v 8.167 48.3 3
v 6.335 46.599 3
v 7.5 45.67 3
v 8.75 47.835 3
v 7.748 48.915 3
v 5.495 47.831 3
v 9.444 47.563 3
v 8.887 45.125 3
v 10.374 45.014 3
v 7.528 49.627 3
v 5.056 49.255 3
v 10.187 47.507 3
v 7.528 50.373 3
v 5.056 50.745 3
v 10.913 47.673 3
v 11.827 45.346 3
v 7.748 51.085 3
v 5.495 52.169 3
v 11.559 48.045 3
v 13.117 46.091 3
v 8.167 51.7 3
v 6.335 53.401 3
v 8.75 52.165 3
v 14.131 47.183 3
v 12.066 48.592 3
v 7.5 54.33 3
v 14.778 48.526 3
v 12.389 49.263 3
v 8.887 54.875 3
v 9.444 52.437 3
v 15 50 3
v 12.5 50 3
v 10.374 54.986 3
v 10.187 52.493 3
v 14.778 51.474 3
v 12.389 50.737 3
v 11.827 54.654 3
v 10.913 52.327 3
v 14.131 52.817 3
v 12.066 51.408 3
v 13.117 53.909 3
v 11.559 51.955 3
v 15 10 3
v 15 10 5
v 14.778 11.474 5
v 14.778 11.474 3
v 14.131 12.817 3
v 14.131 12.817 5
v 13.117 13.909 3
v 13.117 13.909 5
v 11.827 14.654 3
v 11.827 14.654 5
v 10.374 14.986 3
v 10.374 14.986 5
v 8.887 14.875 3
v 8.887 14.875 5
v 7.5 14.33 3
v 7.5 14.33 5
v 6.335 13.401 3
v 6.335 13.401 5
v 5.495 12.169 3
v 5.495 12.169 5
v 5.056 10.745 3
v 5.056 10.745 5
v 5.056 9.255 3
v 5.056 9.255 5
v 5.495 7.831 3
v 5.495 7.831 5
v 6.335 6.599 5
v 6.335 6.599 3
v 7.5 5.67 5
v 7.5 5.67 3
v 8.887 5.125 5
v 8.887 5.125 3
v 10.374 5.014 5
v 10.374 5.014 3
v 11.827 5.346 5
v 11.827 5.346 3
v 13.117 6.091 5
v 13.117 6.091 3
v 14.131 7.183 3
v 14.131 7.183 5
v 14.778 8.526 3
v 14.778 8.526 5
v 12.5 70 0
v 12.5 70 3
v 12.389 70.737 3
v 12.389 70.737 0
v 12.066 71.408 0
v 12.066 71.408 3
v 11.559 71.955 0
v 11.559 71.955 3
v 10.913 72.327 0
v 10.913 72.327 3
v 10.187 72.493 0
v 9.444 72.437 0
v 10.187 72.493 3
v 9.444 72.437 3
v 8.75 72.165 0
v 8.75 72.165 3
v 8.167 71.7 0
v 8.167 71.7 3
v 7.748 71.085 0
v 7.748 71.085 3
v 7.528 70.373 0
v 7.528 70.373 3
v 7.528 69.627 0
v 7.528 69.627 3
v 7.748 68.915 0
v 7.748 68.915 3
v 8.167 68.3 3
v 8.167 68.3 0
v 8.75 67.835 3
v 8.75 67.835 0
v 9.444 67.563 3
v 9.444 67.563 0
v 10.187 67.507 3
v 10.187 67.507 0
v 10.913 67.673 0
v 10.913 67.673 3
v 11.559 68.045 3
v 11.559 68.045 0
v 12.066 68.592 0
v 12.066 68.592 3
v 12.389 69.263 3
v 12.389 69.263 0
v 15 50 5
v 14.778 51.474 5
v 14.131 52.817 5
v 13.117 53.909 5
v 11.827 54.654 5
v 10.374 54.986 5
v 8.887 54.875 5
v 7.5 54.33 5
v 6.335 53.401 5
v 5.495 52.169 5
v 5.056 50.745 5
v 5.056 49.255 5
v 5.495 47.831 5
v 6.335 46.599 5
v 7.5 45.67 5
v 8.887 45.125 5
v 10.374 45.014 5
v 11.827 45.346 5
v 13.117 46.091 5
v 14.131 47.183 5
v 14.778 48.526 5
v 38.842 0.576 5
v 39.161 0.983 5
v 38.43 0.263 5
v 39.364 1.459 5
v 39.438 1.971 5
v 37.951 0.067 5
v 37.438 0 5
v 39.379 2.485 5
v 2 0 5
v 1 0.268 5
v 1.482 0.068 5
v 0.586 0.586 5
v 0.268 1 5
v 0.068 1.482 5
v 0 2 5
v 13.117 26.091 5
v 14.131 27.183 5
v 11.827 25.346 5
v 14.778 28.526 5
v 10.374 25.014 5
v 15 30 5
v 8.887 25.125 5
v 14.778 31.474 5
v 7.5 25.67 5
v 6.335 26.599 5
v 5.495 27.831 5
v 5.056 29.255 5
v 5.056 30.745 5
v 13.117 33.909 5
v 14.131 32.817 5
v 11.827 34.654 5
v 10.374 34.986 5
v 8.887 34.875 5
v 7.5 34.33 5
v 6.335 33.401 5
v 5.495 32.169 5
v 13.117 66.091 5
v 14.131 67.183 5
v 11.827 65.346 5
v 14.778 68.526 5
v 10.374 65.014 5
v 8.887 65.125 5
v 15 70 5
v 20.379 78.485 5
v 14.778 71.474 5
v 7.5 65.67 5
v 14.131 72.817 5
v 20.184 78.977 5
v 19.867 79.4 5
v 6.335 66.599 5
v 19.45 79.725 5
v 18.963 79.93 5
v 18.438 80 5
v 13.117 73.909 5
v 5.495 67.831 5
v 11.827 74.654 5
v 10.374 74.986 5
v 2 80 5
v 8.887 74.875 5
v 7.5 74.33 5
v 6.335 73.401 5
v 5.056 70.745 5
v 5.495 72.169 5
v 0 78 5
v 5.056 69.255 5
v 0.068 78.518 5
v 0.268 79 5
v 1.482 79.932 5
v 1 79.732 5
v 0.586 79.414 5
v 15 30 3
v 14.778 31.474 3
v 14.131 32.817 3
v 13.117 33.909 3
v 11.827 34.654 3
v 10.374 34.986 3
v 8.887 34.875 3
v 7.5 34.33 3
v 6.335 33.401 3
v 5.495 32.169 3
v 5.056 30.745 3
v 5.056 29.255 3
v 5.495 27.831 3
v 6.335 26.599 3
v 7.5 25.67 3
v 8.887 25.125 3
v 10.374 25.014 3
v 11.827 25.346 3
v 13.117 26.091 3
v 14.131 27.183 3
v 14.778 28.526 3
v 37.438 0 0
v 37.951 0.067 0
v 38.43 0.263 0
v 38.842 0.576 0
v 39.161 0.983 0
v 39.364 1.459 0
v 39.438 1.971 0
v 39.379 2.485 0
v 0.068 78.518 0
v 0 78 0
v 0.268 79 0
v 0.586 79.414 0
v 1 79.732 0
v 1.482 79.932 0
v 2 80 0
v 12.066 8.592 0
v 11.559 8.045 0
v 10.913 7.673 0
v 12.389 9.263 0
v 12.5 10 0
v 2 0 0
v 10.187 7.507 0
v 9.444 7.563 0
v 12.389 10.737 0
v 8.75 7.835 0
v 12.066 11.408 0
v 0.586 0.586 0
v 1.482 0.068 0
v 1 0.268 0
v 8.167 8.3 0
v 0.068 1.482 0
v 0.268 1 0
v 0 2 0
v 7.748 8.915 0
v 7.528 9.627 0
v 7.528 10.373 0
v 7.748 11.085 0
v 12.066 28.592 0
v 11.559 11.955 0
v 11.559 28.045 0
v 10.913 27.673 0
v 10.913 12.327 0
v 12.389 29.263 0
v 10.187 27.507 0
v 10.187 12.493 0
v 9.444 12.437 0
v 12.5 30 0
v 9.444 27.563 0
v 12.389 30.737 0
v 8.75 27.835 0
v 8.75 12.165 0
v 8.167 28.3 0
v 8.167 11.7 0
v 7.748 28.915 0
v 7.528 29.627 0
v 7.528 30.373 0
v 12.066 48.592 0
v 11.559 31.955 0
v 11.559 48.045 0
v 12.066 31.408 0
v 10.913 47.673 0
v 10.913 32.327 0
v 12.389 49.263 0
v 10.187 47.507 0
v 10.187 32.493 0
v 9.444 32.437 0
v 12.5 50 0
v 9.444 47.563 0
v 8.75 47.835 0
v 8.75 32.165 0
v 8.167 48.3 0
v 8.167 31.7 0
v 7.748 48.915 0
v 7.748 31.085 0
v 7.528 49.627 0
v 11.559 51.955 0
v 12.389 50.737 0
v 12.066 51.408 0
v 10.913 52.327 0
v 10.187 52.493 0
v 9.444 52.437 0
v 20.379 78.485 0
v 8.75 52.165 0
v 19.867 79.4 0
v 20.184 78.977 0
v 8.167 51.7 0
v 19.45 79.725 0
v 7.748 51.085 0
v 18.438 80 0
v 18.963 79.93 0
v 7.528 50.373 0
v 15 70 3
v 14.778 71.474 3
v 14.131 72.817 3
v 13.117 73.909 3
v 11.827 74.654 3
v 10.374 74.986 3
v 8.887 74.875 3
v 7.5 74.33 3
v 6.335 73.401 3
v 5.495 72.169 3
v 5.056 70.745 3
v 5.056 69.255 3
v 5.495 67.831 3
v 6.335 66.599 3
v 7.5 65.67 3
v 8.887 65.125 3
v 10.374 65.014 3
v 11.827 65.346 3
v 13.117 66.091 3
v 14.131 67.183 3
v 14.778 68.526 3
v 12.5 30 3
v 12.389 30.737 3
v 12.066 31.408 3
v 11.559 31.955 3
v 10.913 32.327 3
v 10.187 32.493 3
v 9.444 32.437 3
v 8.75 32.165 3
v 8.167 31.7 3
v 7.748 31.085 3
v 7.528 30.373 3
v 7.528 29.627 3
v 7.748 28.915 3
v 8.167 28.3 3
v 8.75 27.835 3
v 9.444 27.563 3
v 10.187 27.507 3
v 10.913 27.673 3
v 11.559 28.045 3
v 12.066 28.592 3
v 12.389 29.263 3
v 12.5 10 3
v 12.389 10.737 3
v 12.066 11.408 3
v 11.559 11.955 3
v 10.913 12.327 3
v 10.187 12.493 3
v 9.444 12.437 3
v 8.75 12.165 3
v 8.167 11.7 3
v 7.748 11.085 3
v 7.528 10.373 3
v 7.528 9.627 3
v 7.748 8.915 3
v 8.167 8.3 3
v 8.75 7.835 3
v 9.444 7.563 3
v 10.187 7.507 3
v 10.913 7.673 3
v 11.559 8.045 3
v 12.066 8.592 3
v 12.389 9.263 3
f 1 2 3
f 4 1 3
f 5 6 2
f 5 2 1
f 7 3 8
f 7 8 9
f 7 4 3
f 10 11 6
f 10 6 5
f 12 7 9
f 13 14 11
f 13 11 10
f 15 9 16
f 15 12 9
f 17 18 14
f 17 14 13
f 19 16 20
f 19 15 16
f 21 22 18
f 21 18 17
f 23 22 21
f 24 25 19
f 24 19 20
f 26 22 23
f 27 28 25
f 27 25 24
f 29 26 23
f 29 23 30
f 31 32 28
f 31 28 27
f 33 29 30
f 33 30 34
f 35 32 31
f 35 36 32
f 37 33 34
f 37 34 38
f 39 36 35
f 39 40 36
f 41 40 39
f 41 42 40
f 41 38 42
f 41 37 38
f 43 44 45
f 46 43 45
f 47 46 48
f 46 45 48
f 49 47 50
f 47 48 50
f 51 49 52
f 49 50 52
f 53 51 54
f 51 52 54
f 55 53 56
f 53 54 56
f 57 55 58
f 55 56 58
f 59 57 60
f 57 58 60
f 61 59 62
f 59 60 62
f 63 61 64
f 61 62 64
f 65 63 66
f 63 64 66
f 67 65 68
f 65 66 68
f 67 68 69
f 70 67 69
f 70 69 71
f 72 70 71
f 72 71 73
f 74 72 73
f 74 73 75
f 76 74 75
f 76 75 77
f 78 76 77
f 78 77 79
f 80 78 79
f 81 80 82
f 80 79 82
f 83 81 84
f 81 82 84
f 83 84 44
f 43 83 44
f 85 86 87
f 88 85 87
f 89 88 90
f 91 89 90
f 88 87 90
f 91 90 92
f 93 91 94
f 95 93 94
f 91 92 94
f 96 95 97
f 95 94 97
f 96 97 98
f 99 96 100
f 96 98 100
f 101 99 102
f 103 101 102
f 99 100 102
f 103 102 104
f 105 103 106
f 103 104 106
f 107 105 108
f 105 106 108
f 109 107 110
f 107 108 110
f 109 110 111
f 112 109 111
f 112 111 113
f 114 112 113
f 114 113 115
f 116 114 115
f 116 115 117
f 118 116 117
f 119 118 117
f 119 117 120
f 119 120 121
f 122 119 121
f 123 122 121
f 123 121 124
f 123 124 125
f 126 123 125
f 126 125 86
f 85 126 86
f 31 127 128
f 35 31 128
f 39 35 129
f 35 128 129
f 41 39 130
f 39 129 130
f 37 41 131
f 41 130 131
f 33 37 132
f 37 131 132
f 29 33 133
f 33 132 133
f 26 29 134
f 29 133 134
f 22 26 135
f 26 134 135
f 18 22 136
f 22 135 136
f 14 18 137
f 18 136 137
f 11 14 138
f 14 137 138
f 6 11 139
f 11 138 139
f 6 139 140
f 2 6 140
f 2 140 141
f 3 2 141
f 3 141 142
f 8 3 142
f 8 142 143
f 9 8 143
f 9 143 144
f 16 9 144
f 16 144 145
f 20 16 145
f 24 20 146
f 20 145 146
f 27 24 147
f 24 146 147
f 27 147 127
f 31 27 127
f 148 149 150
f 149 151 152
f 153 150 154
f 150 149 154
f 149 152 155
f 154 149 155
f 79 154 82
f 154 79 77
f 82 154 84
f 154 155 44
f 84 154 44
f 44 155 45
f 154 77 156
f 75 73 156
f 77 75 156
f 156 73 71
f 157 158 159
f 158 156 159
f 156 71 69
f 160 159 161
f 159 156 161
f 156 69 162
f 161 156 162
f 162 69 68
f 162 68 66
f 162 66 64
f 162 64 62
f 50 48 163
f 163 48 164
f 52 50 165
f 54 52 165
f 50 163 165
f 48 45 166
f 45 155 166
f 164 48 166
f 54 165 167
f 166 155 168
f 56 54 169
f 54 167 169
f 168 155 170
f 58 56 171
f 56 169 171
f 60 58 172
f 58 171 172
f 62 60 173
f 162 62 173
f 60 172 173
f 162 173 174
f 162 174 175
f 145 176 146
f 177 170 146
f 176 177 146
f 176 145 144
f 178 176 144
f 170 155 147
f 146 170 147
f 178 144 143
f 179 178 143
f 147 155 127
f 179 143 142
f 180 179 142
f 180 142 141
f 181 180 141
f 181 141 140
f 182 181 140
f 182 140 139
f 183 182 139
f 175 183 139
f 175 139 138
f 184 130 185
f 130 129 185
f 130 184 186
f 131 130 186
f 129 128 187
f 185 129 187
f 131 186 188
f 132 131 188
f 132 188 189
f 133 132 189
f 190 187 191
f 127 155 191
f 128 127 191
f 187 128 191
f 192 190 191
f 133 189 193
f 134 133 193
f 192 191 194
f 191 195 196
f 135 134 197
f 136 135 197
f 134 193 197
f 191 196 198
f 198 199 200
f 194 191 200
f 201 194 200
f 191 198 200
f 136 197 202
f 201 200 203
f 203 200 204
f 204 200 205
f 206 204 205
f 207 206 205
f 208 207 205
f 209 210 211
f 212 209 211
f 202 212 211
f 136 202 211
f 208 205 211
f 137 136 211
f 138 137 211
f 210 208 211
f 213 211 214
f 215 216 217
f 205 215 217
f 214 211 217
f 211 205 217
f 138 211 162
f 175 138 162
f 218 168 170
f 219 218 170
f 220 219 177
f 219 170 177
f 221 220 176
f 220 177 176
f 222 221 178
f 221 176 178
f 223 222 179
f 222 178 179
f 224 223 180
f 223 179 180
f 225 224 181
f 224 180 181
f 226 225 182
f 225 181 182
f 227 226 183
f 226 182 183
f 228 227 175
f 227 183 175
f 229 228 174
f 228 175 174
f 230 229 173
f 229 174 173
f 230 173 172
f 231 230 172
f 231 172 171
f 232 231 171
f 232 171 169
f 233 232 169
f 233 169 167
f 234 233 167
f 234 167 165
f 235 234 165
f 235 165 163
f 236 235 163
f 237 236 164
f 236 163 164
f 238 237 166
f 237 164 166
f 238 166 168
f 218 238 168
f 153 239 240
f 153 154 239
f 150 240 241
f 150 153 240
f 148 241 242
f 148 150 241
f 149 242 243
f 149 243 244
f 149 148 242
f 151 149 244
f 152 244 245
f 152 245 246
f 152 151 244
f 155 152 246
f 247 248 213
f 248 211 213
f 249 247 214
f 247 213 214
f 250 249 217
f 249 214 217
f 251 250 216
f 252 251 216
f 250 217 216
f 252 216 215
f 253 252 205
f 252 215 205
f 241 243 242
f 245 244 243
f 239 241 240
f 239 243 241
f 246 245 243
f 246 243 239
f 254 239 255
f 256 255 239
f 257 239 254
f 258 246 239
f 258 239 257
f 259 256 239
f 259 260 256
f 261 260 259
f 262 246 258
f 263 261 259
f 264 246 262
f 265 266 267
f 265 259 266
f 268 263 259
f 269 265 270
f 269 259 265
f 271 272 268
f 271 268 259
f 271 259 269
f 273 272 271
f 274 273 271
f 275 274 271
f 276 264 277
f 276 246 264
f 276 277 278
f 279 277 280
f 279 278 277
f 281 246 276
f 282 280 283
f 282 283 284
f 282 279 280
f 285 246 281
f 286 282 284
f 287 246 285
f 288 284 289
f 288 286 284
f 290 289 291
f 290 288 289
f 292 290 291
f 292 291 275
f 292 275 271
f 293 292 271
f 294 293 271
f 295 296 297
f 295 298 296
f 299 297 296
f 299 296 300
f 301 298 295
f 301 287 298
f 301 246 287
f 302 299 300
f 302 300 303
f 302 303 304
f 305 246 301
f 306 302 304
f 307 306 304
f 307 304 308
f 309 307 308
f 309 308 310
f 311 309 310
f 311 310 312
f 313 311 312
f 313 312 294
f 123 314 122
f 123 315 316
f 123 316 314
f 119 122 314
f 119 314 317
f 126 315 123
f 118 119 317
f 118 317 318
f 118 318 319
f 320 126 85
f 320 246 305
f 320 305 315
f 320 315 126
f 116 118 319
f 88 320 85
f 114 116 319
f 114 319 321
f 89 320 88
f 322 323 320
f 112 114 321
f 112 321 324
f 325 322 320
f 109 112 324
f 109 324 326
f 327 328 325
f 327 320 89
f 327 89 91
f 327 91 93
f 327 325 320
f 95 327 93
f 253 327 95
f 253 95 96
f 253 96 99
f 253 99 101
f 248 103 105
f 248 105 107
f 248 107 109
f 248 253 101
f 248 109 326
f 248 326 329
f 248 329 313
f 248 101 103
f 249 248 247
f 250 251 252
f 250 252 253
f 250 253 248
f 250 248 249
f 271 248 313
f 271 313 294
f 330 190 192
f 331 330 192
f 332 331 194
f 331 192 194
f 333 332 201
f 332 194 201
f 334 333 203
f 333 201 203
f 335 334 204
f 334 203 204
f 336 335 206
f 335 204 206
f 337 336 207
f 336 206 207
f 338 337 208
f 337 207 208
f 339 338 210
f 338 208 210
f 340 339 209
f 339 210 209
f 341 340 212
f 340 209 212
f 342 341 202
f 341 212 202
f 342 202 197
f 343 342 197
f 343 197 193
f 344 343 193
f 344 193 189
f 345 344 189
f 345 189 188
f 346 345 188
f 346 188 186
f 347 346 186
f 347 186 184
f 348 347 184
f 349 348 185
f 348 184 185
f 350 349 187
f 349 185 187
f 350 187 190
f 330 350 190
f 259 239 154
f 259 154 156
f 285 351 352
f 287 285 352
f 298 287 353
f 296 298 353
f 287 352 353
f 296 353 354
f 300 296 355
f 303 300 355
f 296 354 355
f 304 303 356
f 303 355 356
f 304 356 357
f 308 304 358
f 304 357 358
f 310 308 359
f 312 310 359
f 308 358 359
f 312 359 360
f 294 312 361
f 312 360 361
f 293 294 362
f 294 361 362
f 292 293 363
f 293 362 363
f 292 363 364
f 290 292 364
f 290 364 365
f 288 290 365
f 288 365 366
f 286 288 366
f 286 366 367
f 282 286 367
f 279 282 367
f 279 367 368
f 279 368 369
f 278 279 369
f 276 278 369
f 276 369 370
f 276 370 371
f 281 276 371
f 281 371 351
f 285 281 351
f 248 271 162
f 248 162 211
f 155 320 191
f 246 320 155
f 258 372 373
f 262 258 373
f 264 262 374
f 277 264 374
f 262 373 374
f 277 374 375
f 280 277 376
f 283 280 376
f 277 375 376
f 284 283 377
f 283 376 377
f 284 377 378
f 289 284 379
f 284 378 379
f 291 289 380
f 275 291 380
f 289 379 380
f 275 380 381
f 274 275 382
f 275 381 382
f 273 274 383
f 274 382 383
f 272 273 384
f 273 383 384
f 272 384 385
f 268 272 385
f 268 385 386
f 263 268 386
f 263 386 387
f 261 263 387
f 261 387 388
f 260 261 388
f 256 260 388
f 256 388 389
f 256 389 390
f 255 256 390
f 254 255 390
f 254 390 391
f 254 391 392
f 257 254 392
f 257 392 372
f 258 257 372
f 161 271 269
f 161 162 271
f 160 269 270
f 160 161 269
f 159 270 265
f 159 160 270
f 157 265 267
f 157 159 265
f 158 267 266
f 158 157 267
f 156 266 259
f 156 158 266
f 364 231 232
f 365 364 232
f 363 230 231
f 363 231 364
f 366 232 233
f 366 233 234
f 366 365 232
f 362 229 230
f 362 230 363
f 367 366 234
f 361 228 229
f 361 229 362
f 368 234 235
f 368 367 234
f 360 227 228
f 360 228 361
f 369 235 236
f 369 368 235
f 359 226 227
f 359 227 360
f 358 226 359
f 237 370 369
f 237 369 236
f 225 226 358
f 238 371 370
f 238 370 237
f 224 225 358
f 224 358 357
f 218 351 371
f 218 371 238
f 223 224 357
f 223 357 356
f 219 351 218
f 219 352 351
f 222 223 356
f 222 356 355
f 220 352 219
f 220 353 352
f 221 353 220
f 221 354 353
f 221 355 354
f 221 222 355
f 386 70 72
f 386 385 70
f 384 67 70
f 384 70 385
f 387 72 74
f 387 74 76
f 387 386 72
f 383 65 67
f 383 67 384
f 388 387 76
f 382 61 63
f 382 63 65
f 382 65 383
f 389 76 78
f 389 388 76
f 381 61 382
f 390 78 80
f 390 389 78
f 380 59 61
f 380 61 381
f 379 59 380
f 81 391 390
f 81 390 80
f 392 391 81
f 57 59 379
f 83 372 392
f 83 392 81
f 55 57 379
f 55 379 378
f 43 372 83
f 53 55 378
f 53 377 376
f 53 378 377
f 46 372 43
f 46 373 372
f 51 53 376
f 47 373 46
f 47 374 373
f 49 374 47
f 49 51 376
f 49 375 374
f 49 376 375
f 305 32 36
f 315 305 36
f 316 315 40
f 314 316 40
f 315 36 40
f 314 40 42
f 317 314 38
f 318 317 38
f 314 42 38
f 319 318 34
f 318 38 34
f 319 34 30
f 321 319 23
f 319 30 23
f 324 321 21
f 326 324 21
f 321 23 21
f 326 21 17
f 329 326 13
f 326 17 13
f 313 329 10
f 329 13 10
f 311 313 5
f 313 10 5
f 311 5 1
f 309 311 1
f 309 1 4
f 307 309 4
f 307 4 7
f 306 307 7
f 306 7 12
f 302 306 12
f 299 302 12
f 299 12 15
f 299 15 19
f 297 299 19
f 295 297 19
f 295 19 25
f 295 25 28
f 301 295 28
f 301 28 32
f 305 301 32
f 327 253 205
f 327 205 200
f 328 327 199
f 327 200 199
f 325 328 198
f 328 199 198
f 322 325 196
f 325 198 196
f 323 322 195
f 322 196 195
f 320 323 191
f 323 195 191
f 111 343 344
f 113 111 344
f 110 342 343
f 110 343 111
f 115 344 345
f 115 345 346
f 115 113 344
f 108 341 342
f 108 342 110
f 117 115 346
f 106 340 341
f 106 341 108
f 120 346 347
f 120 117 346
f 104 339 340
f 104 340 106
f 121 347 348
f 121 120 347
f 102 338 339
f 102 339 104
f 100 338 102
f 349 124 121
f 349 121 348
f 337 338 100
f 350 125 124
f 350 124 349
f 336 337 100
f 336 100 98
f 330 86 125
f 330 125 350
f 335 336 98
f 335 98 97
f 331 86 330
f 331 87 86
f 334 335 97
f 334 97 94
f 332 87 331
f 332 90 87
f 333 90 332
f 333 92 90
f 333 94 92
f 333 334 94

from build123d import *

# Parameters (mm, degrees)
BOSS_EXTRUDE1_DEPTH = 5
SKETCH2_R           = 2.5
CUT_EXTRUDE1_DEPTH  = 10
SKETCH3_R           = 5
CUT_EXTRUDE2_DEPTH  = 2
FILLET1_R           = 2


with BuildPart() as part:
    # Sketch1 → Boss-Extrude1 (new body)
    with BuildSketch(Plane.XY):
        Polygon((0, 0), (0, 80), (20, 80), (40, 0), align=None)
    extrude(amount=BOSS_EXTRUDE1_DEPTH)

    # Sketch2 → Cut-Extrude1 (cut)
    with BuildSketch(Plane.XY.offset(5)):
        with Locations((10, 70)):
            Circle(SKETCH2_R)
        with Locations((10, 50)):
            Circle(SKETCH2_R)
        with Locations((10, 30)):
            Circle(SKETCH2_R)
        with Locations((10, 10)):
            Circle(SKETCH2_R)
    extrude(amount=-CUT_EXTRUDE1_DEPTH, mode=Mode.SUBTRACT)

    # Sketch3 → Cut-Extrude2 (cut)
    with BuildSketch(Plane.XY.offset(5)):
        with Locations((10, 70)):
            Circle(SKETCH3_R)
        with Locations((10, 50)):
            Circle(SKETCH3_R)
        with Locations((10, 30)):
            Circle(SKETCH3_R)
        with Locations((10, 10)):
            Circle(SKETCH3_R)
    extrude(amount=-CUT_EXTRUDE2_DEPTH, mode=Mode.SUBTRACT)

    # Fillet1
    fillet1_edges = [part.edges().sort_by_distance(p)[0] for p in [
        (0, 0, 2.5),
        (0, 80, 2.5),
        (20, 80, 2.5),
        (40, 0, 2.5),
    ]]
    fillet(fillet1_edges, radius=FILLET1_R)


solid = part.part
